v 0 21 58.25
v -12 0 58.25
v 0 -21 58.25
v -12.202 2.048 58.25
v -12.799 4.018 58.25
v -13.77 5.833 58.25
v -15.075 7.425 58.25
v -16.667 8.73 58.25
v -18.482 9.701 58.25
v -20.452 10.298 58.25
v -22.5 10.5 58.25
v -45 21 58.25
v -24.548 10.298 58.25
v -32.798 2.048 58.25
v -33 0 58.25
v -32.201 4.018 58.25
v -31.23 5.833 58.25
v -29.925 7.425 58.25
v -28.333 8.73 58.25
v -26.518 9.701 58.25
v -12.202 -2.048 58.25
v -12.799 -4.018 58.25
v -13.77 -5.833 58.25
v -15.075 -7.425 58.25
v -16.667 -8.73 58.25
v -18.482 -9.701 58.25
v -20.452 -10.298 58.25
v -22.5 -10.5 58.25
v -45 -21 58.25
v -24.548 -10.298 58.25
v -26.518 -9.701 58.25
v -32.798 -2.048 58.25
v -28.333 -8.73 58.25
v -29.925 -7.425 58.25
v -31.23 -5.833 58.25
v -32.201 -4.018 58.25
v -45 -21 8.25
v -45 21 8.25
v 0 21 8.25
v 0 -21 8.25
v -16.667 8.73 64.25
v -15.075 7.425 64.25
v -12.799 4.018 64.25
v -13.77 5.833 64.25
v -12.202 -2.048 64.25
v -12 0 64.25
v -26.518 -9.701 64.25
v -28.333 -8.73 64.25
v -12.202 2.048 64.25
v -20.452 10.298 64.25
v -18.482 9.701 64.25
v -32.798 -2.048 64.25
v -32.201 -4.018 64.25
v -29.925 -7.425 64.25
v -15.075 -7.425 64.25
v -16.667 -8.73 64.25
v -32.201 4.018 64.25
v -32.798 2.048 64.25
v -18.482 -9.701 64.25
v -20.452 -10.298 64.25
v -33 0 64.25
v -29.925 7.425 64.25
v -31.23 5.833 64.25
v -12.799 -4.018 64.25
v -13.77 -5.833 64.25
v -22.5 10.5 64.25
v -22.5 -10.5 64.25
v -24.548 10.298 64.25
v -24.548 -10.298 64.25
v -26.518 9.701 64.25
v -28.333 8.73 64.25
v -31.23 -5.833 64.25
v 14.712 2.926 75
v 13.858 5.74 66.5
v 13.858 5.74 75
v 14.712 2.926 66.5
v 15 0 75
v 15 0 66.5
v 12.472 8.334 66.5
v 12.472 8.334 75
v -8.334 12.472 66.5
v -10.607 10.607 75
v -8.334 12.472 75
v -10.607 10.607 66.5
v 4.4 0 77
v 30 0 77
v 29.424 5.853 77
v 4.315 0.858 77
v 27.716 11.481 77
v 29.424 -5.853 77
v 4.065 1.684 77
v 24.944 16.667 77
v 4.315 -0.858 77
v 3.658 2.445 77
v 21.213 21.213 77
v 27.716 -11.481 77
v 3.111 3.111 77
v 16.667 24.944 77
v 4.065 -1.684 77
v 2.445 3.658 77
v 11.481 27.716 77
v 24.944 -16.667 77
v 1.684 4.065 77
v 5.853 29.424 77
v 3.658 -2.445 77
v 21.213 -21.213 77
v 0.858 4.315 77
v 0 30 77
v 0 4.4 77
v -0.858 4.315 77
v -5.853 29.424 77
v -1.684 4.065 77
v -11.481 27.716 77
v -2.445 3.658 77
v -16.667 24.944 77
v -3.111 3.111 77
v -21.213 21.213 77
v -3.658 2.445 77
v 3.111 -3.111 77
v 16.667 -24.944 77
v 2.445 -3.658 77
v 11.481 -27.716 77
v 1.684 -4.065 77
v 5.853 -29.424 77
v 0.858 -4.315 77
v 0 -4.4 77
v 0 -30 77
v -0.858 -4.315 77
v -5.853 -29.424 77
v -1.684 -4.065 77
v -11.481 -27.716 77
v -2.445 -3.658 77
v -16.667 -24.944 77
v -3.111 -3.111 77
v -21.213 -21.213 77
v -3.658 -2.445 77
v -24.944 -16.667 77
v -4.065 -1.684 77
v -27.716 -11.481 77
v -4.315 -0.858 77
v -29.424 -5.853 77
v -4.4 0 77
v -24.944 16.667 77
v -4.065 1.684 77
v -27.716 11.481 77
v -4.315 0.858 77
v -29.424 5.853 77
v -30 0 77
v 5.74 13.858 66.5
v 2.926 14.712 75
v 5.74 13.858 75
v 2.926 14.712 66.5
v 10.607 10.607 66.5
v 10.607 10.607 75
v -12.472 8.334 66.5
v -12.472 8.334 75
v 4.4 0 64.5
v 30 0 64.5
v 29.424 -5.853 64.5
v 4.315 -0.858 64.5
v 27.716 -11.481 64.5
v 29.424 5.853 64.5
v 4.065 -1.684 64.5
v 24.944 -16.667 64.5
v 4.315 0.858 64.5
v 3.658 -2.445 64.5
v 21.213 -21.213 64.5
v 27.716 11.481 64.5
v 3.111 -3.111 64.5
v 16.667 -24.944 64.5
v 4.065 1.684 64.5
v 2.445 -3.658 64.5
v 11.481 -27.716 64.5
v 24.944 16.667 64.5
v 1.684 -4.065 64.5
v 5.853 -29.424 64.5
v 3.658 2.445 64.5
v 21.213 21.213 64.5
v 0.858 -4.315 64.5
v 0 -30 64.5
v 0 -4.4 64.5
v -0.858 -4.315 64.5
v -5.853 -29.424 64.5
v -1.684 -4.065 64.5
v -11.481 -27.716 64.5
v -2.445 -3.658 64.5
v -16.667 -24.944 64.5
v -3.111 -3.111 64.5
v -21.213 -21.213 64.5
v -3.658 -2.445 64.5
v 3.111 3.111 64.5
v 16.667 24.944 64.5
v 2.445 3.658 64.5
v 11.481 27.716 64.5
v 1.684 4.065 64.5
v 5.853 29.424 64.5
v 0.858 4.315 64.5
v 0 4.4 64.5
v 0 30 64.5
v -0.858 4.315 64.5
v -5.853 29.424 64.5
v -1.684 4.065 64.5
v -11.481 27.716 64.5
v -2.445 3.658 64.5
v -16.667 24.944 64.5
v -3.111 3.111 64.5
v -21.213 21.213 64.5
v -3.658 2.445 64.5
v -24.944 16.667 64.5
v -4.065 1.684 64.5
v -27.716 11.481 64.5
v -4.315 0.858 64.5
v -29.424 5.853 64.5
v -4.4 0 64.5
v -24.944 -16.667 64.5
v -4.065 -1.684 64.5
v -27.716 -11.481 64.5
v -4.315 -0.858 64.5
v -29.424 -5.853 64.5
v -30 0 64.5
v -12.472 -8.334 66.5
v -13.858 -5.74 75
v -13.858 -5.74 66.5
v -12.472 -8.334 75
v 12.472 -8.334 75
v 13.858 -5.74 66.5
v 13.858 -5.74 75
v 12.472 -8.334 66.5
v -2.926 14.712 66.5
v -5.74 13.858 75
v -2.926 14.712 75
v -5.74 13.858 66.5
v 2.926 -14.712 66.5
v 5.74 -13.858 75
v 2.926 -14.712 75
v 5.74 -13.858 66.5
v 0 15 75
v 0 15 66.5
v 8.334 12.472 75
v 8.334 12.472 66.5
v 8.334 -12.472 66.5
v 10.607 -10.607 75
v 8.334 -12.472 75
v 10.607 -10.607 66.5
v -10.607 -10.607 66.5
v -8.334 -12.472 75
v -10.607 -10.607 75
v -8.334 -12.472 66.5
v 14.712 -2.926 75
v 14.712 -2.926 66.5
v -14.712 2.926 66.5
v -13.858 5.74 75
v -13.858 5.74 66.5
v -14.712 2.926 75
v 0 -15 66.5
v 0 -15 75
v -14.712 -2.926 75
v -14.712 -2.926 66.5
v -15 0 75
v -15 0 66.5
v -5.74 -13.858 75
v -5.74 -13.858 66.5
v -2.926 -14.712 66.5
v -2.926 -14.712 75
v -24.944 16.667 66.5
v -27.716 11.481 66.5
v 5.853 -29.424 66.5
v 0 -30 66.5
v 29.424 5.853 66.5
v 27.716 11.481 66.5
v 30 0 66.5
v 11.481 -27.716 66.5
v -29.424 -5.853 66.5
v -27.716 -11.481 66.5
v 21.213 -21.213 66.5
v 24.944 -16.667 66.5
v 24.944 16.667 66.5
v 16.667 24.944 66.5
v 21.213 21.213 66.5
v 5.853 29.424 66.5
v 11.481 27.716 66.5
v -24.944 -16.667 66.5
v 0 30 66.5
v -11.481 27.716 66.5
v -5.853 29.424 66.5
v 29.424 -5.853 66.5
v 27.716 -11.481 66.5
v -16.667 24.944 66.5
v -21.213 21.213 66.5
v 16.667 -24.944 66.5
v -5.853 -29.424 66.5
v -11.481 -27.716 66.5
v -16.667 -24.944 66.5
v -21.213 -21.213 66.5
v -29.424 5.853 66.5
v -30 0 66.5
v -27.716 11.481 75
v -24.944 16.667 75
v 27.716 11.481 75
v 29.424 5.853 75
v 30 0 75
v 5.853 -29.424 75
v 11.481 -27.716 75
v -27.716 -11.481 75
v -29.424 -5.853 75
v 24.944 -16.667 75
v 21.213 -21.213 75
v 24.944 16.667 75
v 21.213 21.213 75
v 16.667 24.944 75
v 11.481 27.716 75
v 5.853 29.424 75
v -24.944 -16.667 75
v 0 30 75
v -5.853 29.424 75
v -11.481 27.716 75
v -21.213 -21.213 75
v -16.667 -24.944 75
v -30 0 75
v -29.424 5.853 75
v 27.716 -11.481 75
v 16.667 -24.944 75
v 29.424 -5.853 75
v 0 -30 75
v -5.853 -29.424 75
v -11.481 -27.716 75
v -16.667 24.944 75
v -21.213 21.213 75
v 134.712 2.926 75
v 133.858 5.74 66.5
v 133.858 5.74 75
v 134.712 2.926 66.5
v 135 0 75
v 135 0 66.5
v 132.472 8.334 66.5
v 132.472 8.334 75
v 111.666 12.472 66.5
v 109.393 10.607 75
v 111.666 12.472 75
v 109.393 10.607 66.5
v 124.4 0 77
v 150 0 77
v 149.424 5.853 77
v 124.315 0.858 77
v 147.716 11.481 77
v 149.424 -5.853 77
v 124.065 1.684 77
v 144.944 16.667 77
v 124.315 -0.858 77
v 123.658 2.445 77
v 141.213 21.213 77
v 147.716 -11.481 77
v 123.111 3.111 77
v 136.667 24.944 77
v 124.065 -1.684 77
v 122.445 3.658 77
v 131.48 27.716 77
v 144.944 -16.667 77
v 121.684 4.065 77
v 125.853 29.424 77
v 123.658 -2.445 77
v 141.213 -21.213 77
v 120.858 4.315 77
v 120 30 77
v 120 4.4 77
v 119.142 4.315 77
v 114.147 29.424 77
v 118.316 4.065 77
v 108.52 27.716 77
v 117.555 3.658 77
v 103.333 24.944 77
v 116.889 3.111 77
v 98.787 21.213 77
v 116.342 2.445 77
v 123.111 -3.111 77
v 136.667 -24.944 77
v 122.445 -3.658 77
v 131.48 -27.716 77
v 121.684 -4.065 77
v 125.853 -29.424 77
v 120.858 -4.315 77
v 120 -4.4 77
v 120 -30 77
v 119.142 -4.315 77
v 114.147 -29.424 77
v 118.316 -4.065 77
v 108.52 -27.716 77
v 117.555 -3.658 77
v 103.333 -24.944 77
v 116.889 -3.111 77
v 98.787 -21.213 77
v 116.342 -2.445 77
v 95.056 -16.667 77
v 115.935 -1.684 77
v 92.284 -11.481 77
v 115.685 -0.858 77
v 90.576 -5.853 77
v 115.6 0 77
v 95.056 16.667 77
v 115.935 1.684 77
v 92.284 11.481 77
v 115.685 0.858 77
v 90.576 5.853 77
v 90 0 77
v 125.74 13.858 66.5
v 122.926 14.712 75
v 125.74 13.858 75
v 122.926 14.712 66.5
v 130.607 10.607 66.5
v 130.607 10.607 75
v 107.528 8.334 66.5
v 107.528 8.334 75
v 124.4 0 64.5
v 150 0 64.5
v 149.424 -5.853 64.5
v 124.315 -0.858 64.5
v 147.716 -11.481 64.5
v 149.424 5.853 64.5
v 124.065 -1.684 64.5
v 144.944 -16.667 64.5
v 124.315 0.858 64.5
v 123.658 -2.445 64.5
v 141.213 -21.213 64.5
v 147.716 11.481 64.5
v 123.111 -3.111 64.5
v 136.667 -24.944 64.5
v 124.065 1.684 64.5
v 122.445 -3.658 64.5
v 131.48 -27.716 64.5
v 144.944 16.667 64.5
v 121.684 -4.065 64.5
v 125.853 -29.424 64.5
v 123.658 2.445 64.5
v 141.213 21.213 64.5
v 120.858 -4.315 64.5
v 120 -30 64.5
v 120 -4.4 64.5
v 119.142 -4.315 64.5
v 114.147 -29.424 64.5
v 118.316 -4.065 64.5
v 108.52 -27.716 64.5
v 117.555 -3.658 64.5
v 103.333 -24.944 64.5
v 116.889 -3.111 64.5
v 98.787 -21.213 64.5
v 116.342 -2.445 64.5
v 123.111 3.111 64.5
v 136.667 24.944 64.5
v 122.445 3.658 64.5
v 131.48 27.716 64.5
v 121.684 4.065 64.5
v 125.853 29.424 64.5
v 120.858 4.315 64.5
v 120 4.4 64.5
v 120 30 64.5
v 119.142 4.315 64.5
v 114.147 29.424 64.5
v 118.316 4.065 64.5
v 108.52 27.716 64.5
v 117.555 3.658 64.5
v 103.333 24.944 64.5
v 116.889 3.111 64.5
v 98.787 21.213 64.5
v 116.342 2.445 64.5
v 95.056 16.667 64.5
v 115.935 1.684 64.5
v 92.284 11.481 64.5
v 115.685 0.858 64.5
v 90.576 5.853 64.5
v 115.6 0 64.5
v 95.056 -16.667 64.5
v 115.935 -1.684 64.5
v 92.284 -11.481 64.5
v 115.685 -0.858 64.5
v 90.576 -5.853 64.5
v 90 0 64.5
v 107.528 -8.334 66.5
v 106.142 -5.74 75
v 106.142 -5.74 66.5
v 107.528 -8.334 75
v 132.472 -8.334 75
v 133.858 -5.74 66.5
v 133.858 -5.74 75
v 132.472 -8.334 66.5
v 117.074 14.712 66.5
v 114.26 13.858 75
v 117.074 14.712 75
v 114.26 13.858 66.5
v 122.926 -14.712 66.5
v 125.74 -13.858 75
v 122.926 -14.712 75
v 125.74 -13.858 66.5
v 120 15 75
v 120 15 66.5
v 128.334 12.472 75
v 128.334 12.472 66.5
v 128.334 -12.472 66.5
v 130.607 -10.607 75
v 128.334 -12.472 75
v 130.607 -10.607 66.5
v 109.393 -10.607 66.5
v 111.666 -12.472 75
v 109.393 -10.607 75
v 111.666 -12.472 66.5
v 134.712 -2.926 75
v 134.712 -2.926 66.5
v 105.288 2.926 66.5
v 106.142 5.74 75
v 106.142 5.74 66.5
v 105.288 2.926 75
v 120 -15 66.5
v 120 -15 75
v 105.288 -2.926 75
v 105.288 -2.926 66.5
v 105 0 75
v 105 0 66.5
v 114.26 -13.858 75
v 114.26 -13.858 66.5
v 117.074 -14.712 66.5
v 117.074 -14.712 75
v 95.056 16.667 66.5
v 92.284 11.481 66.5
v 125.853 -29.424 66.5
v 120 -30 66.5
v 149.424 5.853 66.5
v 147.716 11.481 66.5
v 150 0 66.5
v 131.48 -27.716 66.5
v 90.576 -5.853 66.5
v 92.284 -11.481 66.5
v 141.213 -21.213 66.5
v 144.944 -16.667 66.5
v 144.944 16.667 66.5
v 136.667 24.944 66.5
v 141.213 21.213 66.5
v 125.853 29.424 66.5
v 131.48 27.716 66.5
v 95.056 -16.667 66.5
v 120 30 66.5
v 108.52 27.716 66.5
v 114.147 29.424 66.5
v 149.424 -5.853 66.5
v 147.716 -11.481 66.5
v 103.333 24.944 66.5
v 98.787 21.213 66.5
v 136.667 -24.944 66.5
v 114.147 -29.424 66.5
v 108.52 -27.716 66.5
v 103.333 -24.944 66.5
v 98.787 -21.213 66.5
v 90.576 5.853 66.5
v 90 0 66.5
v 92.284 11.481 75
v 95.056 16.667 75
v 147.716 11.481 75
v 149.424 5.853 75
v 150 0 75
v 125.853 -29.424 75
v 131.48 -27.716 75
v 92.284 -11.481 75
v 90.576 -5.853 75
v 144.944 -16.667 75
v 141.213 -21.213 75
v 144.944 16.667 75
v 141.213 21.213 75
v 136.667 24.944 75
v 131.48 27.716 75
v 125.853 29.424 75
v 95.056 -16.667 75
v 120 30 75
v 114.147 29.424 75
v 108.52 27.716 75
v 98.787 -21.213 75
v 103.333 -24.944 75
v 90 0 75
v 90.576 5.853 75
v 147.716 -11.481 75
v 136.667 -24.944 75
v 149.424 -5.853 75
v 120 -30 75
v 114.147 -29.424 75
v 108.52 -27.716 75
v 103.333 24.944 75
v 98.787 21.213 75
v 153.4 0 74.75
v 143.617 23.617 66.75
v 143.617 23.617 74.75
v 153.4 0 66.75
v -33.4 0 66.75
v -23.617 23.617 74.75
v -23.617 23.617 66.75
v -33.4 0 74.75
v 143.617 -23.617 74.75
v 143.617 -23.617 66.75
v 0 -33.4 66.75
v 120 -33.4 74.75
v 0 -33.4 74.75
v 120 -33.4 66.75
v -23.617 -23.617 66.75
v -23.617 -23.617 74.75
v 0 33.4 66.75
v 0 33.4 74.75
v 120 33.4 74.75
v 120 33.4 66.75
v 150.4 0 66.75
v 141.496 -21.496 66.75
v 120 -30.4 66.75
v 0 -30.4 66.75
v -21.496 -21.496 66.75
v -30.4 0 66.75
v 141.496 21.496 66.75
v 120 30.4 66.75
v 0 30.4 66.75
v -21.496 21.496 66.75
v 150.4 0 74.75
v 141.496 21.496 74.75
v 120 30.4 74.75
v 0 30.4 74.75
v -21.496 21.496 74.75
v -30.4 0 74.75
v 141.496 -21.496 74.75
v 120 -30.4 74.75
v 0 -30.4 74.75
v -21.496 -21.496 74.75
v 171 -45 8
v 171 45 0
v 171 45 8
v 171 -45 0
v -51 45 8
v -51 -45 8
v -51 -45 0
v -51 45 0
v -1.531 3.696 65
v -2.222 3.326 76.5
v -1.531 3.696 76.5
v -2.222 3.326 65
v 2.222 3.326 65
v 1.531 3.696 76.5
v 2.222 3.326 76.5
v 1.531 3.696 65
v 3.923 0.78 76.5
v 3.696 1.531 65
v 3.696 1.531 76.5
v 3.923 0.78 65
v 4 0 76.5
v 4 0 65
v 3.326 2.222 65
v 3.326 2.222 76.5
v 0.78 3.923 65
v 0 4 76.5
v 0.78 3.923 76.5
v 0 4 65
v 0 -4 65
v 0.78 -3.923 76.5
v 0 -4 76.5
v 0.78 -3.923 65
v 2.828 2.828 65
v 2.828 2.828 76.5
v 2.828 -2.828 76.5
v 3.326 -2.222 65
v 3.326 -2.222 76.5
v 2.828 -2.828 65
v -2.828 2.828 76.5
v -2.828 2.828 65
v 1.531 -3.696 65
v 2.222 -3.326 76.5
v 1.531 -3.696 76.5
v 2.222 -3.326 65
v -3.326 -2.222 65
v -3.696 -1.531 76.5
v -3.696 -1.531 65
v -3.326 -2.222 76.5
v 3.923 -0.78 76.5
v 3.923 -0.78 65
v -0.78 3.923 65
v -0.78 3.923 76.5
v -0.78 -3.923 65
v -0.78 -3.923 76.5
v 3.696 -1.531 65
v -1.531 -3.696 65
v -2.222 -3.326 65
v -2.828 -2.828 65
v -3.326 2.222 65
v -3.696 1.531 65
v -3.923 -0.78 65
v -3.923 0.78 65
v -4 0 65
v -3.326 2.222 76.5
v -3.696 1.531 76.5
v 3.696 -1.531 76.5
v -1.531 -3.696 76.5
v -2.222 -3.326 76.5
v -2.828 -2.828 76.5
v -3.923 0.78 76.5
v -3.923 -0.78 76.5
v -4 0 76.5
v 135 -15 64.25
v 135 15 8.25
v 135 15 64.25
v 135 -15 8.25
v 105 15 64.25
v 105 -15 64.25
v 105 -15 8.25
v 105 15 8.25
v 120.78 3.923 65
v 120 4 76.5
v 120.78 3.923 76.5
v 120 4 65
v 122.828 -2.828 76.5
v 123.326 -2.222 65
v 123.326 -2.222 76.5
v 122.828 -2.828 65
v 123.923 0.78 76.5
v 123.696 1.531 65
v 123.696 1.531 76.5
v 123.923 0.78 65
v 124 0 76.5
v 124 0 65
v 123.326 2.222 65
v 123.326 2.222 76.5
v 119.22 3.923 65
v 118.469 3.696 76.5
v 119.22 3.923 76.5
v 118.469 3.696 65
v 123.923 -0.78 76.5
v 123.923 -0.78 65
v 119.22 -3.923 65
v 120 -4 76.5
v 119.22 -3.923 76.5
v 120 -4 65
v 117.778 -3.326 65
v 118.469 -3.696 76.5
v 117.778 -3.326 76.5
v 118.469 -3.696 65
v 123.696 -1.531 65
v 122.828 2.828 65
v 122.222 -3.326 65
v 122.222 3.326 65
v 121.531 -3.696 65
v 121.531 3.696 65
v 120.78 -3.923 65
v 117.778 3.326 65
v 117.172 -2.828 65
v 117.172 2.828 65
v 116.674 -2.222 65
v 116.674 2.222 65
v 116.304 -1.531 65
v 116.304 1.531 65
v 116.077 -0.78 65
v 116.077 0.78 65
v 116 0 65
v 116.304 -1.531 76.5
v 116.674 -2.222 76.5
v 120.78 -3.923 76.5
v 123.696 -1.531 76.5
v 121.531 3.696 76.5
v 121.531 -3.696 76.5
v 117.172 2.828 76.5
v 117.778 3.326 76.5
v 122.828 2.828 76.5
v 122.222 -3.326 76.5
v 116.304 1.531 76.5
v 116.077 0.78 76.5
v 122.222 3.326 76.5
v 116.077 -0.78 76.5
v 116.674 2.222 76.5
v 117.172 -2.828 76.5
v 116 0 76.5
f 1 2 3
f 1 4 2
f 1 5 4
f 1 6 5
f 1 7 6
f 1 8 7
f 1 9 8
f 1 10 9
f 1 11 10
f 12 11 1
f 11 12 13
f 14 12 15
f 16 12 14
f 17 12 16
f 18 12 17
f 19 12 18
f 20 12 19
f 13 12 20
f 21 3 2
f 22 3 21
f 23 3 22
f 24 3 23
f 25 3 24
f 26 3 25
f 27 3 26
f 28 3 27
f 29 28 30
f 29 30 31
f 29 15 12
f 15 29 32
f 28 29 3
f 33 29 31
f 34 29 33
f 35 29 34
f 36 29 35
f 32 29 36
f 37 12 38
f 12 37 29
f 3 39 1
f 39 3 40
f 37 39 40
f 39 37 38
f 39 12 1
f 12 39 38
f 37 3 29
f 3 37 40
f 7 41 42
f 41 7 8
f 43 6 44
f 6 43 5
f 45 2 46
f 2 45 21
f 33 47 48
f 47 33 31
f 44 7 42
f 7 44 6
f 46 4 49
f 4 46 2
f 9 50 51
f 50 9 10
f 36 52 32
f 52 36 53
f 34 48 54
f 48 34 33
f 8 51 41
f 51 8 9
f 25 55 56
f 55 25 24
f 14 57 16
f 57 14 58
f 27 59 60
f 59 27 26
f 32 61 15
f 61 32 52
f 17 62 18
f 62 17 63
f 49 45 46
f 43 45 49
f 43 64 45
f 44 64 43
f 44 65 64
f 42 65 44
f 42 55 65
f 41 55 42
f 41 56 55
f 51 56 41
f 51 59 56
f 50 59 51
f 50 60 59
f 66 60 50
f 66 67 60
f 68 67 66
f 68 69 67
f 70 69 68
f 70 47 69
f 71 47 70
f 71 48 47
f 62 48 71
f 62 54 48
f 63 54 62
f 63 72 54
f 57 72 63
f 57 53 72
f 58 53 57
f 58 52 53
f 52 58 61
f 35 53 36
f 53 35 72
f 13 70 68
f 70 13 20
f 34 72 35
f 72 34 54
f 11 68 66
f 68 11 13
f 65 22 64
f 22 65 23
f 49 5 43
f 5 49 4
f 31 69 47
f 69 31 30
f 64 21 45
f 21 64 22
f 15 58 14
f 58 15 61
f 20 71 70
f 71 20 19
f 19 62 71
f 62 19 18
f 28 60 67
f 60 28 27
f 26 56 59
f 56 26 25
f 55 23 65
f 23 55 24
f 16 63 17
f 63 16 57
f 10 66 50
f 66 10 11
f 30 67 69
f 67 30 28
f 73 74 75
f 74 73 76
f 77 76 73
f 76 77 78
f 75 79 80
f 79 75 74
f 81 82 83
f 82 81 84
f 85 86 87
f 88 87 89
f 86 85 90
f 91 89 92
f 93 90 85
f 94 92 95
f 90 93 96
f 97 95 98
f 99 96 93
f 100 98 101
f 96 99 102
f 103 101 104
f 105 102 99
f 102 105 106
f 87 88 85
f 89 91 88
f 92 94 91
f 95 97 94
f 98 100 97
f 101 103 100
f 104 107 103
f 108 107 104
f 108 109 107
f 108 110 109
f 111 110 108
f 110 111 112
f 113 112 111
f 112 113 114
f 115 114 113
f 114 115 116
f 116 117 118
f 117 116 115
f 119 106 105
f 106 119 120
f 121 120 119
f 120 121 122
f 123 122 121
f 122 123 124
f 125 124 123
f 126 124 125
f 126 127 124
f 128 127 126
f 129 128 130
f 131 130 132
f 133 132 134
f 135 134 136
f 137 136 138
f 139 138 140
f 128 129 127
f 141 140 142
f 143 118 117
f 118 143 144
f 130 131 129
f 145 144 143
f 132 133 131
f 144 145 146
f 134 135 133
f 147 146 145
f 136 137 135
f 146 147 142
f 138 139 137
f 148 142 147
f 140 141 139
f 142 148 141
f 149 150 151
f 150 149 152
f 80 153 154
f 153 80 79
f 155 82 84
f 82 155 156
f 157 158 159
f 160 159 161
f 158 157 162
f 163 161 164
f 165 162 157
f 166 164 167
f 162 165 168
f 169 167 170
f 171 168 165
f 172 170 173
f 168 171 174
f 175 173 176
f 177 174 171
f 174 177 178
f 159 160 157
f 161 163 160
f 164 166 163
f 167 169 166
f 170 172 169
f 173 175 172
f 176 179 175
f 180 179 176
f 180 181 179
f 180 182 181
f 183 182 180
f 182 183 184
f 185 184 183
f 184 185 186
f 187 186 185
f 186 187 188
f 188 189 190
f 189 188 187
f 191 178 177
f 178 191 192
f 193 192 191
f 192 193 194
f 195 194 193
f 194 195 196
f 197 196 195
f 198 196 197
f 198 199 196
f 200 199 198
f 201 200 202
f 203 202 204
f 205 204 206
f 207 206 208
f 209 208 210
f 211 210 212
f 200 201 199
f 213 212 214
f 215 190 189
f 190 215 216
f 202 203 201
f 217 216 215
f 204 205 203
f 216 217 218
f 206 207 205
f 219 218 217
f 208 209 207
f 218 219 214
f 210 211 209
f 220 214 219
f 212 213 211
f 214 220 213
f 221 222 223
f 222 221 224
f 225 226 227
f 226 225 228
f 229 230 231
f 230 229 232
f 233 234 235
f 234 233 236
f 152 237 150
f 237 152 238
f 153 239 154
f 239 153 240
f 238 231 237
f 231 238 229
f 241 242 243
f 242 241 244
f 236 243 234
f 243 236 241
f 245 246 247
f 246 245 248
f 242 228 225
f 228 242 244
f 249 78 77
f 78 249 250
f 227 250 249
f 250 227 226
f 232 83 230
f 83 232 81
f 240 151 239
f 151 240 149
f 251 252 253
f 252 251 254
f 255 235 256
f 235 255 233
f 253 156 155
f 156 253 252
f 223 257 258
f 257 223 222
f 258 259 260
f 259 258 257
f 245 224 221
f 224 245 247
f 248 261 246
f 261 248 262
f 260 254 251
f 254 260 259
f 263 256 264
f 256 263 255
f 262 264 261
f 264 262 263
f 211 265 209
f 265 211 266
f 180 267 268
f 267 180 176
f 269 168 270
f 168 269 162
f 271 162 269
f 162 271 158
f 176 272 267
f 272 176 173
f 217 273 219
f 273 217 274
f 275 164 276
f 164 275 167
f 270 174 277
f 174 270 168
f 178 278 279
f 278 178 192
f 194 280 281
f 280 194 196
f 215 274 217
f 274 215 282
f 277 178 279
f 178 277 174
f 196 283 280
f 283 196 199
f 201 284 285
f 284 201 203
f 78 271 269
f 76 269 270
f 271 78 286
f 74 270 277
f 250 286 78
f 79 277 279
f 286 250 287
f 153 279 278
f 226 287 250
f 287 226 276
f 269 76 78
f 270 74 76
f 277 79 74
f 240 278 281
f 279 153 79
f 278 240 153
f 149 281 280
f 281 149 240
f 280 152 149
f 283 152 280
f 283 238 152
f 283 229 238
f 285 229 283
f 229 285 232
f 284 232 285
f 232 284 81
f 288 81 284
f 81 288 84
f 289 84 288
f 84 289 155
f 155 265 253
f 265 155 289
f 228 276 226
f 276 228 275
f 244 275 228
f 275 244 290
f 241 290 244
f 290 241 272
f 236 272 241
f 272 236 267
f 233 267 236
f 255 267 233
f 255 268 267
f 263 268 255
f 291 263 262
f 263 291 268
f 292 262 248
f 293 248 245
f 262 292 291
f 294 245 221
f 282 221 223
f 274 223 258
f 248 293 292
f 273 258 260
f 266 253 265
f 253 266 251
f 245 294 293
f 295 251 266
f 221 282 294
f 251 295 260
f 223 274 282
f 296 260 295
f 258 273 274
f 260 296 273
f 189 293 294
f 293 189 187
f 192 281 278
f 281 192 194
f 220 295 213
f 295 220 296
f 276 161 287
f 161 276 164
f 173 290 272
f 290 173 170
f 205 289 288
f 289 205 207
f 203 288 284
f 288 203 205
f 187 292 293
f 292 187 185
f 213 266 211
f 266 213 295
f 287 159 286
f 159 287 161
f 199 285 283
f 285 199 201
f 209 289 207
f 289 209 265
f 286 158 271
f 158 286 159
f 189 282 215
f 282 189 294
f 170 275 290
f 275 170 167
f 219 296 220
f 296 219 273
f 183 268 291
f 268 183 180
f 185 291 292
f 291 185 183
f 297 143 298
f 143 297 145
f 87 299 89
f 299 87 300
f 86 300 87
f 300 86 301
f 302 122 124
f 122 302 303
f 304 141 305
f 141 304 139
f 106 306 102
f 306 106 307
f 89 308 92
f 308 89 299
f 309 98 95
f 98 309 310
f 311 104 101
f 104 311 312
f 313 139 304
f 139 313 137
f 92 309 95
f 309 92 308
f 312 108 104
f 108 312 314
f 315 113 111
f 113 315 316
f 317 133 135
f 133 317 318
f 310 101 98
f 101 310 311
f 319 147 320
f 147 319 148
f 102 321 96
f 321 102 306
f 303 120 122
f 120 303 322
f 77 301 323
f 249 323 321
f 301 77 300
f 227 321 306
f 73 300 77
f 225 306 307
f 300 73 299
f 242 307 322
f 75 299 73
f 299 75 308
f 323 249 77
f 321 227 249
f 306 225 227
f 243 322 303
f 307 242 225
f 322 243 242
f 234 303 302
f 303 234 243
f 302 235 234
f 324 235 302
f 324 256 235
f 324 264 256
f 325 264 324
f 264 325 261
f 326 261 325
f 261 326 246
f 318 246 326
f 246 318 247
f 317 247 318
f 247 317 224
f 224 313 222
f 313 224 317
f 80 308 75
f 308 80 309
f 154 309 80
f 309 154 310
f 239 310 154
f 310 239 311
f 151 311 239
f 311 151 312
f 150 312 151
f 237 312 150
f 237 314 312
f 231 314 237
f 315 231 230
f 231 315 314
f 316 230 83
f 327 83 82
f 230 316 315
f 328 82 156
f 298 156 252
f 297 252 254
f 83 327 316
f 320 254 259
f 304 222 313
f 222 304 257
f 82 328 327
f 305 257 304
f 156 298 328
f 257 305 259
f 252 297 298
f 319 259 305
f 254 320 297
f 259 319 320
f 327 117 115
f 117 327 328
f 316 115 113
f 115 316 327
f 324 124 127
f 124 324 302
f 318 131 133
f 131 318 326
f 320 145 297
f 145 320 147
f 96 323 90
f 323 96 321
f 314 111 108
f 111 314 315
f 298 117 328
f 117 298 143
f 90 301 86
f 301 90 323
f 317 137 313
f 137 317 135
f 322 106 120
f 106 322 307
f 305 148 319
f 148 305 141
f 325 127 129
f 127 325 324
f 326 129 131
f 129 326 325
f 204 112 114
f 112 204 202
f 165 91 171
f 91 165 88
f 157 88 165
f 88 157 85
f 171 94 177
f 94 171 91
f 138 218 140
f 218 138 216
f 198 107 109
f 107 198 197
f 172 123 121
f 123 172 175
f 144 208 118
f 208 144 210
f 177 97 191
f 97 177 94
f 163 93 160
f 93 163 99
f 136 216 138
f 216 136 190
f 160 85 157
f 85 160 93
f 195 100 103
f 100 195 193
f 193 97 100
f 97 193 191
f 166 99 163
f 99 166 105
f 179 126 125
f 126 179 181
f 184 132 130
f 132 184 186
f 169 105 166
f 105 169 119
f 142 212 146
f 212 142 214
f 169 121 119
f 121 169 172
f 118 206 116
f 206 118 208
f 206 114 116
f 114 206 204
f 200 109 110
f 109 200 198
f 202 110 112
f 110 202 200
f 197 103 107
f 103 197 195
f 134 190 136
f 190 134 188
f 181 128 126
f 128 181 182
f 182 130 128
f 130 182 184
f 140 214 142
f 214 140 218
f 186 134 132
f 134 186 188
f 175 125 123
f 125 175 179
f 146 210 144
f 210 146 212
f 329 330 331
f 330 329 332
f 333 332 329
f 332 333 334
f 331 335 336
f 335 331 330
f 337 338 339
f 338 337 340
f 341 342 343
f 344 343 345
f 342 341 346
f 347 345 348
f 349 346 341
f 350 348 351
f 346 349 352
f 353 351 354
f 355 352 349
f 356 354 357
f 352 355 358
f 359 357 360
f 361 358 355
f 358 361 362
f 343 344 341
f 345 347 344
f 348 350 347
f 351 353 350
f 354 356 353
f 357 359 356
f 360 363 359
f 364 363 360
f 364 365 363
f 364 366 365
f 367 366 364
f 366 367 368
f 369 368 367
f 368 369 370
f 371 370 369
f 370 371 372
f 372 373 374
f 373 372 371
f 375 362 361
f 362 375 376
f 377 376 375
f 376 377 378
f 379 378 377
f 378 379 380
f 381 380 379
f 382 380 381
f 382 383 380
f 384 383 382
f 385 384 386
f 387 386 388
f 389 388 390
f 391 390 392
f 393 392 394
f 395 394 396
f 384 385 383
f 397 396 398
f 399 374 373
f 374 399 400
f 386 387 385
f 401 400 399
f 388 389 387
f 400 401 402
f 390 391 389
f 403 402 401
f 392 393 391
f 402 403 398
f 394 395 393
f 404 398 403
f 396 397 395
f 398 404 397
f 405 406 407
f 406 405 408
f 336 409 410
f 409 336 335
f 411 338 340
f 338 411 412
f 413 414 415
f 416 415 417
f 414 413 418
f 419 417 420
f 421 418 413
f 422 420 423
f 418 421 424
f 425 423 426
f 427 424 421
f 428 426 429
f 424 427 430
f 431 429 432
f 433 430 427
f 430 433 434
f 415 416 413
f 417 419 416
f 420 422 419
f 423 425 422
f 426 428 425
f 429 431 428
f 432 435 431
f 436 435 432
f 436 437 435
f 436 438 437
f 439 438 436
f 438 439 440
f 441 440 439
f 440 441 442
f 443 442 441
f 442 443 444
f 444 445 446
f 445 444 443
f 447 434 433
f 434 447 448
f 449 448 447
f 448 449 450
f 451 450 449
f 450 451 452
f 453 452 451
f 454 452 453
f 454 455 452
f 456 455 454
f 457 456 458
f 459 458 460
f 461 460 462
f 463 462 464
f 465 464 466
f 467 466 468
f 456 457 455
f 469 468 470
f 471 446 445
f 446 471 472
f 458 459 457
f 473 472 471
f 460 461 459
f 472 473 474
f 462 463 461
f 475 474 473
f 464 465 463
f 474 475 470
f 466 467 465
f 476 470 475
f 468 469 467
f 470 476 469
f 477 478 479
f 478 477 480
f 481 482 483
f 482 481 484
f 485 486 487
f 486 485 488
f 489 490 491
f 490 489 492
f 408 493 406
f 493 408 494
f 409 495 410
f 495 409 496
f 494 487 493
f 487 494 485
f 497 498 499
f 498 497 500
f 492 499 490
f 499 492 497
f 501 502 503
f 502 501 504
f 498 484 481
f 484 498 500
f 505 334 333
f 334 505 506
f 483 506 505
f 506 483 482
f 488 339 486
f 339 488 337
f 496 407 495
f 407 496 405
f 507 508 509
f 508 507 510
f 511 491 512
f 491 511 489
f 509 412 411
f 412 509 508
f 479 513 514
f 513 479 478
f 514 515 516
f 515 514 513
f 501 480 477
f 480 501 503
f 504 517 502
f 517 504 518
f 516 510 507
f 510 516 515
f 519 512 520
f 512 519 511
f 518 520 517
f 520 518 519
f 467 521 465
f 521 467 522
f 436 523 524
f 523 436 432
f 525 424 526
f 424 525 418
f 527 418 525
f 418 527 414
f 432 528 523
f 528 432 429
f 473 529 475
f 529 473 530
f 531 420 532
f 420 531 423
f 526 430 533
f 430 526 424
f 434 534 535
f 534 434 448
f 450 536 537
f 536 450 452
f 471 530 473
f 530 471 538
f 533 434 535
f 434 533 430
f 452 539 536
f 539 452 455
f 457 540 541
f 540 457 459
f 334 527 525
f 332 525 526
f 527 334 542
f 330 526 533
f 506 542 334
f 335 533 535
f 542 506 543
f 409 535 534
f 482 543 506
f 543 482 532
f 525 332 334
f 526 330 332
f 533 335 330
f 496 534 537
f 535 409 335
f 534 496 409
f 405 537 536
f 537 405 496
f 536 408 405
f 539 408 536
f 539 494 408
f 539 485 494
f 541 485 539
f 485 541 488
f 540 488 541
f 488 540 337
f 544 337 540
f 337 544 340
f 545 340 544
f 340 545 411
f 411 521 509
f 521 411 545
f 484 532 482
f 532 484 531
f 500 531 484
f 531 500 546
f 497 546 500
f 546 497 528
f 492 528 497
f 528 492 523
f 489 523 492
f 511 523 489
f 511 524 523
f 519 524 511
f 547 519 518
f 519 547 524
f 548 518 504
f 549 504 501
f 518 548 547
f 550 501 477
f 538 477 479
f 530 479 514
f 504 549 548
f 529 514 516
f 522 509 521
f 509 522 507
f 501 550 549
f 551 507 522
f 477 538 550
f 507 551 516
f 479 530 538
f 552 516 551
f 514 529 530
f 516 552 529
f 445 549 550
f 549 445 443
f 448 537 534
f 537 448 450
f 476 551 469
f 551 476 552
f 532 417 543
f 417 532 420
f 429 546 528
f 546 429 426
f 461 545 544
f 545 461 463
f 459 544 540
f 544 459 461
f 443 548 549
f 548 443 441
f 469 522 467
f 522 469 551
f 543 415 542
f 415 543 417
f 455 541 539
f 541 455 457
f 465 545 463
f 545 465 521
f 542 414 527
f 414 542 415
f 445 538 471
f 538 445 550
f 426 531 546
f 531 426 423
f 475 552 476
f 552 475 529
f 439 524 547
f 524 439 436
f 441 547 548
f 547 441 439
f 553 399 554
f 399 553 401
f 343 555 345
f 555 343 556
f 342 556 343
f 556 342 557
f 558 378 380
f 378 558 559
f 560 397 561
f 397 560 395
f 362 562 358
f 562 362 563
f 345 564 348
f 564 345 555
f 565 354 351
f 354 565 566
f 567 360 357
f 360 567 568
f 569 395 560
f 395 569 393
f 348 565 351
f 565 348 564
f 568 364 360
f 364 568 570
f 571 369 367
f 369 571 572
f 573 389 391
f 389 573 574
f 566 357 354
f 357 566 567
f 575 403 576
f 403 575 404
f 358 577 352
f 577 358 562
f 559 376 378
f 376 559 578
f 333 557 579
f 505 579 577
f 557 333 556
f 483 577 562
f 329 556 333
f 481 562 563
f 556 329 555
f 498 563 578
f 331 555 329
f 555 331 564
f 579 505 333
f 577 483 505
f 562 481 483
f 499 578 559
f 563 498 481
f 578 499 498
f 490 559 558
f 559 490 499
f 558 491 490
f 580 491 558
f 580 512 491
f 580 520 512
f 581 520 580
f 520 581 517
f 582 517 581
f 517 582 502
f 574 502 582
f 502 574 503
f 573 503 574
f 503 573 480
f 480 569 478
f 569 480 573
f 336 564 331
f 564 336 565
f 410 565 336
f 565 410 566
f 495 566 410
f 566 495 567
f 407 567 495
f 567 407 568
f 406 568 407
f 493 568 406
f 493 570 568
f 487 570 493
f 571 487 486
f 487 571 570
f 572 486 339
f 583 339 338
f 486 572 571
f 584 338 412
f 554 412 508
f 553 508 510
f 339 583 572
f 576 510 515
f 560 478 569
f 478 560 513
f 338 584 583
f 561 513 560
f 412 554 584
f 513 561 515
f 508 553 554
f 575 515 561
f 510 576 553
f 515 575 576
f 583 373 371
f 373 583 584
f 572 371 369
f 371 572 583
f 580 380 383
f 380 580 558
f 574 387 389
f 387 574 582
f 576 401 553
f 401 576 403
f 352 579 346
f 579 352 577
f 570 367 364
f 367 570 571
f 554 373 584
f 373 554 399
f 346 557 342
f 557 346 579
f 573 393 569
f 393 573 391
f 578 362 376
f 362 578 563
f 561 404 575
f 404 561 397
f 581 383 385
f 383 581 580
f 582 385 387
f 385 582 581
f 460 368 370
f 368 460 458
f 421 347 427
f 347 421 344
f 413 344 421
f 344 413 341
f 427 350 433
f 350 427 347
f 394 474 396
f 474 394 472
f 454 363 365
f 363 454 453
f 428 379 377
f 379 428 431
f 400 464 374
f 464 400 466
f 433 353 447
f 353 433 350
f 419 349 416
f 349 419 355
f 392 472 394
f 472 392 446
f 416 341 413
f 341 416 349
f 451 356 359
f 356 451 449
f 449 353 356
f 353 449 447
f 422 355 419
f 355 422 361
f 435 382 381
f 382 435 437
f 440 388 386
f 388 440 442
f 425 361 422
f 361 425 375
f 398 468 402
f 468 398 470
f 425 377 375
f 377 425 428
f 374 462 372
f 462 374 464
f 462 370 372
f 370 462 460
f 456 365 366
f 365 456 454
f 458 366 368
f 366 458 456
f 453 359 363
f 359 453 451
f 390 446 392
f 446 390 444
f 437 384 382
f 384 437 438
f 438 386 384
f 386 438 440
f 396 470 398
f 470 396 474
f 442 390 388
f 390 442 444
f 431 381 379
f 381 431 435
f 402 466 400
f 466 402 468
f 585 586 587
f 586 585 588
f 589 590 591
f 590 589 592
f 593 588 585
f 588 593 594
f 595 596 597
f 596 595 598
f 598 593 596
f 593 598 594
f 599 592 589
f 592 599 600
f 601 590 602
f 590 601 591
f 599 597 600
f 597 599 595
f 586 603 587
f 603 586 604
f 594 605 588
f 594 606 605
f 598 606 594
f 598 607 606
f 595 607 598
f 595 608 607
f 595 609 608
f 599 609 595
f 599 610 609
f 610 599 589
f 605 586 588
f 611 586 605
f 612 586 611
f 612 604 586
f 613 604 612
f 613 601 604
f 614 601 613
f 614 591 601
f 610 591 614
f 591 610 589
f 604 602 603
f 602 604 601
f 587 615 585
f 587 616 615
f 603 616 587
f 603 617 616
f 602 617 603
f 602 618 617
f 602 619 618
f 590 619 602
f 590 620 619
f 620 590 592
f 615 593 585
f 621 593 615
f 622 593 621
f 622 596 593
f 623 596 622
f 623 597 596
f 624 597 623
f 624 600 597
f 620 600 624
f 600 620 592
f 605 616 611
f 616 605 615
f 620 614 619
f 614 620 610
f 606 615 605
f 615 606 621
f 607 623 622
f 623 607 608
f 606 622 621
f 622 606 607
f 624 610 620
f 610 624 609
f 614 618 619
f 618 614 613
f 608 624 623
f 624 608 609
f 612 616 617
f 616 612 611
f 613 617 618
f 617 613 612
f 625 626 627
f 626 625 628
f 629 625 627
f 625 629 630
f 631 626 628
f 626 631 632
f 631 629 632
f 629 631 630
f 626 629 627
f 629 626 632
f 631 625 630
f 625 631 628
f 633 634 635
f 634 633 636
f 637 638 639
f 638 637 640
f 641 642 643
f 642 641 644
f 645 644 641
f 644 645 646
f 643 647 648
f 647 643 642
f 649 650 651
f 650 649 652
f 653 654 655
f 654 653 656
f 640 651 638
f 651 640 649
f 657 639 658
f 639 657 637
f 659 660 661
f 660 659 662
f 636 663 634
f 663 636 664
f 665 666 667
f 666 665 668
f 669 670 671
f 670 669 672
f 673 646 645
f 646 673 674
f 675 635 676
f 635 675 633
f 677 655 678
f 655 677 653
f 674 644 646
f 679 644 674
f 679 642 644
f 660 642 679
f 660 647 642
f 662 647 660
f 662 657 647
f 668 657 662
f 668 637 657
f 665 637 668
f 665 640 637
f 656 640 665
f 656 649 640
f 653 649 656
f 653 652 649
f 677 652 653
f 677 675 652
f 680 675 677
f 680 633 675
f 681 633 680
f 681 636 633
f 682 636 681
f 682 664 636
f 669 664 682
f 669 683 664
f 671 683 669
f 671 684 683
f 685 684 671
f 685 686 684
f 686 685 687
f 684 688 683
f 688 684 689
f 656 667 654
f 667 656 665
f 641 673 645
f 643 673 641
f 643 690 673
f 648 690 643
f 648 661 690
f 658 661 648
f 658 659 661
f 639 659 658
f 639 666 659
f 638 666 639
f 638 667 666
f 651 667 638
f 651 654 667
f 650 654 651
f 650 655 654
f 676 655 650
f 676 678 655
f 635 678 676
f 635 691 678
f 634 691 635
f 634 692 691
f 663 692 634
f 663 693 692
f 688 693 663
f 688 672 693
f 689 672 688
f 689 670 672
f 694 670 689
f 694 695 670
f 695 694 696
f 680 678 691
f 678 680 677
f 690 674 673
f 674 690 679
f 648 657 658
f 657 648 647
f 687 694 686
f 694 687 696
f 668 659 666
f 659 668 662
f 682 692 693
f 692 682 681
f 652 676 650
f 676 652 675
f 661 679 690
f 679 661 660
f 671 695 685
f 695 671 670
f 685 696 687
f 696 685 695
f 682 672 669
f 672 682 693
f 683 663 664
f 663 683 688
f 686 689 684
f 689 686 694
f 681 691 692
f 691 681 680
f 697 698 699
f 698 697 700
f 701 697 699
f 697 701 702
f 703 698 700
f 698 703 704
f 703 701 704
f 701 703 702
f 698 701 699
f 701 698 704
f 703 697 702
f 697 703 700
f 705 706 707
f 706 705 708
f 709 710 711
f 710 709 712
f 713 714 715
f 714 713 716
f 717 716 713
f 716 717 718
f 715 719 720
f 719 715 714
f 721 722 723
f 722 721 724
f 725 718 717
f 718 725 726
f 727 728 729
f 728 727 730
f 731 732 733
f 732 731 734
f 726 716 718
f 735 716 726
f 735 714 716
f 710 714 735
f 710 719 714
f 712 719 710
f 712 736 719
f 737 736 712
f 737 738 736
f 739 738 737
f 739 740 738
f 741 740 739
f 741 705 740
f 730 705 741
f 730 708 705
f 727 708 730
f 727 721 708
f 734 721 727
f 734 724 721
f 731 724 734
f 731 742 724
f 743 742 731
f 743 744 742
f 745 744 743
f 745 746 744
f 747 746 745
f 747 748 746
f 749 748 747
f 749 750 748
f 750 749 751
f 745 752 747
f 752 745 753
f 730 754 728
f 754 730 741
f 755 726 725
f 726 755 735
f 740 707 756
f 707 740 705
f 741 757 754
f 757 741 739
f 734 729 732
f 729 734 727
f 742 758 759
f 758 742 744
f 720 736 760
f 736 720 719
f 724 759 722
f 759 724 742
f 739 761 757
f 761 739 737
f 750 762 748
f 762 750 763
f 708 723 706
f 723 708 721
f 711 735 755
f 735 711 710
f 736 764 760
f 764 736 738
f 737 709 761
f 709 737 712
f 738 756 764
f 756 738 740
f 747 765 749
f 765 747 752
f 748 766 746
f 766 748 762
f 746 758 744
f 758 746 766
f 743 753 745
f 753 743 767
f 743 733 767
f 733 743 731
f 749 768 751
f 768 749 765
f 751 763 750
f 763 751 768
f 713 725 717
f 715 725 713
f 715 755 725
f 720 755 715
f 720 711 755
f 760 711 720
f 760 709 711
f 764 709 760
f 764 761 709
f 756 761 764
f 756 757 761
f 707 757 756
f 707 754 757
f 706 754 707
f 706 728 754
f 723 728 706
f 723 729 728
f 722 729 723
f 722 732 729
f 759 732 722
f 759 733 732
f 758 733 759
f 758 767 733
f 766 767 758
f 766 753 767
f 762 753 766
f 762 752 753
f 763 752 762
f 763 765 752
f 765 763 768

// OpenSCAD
$fn = 32;

// ------------------------------------------------------------------------
// Motor belt drive: span 120 mm, pulleys d60, belt 8 mm wide
// Every part is its own module, assembly() places every instance.
// ------------------------------------------------------------------------

// --- part 1 ---
module base_plate() {
  difference() {
    translate([-111, -45, 0]) cube([222, 90, 8]);
  }
}

// --- part 2 ---
module motor() {
  union() {
    translate([-25, -21, 0]) cube([50, 42, 45]);
    translate([28, 0, 22.5]) rotate([0, 90, 0]) cylinder(h = 6, d = 21, center = true);
  }
}

// --- part 3 ---
module drive_shaft() {
  translate([0, 0, -5.75]) cylinder(h = 11.5, d = 8);
}

// --- part 4 ---
module pulley_drive() {
  difference() {
    union() {
      cylinder(h = 12.5, d = 30);
      cylinder(h = 2, d = 60);
      translate([0, 0, 10.5]) cylinder(h = 2, d = 60);
    }
    translate([0, 0, -1]) cylinder(h = 14.5, d = 8.8);
  }
}

// --- part 5 ---
module idler_post() {
  translate([-15, -15, 0]) cube([30, 30, 56]);
}

// --- part 6 ---
module driven_shaft() {
  translate([0, 0, -5.75]) cylinder(h = 11.5, d = 8);
}

// --- part 7 ---
module pulley_driven() {
  difference() {
    union() {
      cylinder(h = 12.5, d = 30);
      cylinder(h = 2, d = 60);
      translate([0, 0, 10.5]) cylinder(h = 2, d = 60);
    }
    translate([0, 0, -1]) cylinder(h = 14.5, d = 8.8);
  }
}

// --- part 8 ---
module drive_belt() {
  difference() {
    linear_extrude(height = 8) polygon(points = concat([for (a = [90 : 45 : 270]) [33.4 * cos(a), 33.4 * sin(a)]], [for (a = [270 : 45 : 450]) [120 + 33.4 * cos(a), 33.4 * sin(a)]]));
    translate([0, 0, -1]) linear_extrude(height = 10) polygon(points = concat([for (a = [90 : 45 : 270]) [30.4 * cos(a), 30.4 * sin(a)]], [for (a = [270 : 45 : 450]) [120 + 30.4 * cos(a), 30.4 * sin(a)]]));
  }
}

// --- assembly ---
module assembly() {
  color([0.80, 0.24, 0.20]) translate([60, 0, 0]) rotate([0, 0, 0]) base_plate();
  color([0.20, 0.45, 0.75]) translate([0, 0, 33.25]) rotate([0, 270, 0]) motor();
  color([0.25, 0.62, 0.32]) translate([0, 0, 70.75]) rotate([0, 0, 0]) drive_shaft();
  color([0.92, 0.70, 0.18]) translate([0, 0, 64.5]) rotate([0, 0, 0]) pulley_drive();
  color([0.58, 0.35, 0.70]) translate([120, 0, 8.25]) rotate([0, 0, 0]) idler_post();
  color([0.16, 0.66, 0.66]) translate([120, 0, 70.75]) rotate([0, 0, 0]) driven_shaft();
  color([0.85, 0.48, 0.18]) translate([120, 0, 64.5]) rotate([0, 0, 0]) pulley_driven();
  color([0.55, 0.60, 0.65]) translate([0, 0, 66.75]) rotate([0, 0, 0]) drive_belt();
}

assembly();
